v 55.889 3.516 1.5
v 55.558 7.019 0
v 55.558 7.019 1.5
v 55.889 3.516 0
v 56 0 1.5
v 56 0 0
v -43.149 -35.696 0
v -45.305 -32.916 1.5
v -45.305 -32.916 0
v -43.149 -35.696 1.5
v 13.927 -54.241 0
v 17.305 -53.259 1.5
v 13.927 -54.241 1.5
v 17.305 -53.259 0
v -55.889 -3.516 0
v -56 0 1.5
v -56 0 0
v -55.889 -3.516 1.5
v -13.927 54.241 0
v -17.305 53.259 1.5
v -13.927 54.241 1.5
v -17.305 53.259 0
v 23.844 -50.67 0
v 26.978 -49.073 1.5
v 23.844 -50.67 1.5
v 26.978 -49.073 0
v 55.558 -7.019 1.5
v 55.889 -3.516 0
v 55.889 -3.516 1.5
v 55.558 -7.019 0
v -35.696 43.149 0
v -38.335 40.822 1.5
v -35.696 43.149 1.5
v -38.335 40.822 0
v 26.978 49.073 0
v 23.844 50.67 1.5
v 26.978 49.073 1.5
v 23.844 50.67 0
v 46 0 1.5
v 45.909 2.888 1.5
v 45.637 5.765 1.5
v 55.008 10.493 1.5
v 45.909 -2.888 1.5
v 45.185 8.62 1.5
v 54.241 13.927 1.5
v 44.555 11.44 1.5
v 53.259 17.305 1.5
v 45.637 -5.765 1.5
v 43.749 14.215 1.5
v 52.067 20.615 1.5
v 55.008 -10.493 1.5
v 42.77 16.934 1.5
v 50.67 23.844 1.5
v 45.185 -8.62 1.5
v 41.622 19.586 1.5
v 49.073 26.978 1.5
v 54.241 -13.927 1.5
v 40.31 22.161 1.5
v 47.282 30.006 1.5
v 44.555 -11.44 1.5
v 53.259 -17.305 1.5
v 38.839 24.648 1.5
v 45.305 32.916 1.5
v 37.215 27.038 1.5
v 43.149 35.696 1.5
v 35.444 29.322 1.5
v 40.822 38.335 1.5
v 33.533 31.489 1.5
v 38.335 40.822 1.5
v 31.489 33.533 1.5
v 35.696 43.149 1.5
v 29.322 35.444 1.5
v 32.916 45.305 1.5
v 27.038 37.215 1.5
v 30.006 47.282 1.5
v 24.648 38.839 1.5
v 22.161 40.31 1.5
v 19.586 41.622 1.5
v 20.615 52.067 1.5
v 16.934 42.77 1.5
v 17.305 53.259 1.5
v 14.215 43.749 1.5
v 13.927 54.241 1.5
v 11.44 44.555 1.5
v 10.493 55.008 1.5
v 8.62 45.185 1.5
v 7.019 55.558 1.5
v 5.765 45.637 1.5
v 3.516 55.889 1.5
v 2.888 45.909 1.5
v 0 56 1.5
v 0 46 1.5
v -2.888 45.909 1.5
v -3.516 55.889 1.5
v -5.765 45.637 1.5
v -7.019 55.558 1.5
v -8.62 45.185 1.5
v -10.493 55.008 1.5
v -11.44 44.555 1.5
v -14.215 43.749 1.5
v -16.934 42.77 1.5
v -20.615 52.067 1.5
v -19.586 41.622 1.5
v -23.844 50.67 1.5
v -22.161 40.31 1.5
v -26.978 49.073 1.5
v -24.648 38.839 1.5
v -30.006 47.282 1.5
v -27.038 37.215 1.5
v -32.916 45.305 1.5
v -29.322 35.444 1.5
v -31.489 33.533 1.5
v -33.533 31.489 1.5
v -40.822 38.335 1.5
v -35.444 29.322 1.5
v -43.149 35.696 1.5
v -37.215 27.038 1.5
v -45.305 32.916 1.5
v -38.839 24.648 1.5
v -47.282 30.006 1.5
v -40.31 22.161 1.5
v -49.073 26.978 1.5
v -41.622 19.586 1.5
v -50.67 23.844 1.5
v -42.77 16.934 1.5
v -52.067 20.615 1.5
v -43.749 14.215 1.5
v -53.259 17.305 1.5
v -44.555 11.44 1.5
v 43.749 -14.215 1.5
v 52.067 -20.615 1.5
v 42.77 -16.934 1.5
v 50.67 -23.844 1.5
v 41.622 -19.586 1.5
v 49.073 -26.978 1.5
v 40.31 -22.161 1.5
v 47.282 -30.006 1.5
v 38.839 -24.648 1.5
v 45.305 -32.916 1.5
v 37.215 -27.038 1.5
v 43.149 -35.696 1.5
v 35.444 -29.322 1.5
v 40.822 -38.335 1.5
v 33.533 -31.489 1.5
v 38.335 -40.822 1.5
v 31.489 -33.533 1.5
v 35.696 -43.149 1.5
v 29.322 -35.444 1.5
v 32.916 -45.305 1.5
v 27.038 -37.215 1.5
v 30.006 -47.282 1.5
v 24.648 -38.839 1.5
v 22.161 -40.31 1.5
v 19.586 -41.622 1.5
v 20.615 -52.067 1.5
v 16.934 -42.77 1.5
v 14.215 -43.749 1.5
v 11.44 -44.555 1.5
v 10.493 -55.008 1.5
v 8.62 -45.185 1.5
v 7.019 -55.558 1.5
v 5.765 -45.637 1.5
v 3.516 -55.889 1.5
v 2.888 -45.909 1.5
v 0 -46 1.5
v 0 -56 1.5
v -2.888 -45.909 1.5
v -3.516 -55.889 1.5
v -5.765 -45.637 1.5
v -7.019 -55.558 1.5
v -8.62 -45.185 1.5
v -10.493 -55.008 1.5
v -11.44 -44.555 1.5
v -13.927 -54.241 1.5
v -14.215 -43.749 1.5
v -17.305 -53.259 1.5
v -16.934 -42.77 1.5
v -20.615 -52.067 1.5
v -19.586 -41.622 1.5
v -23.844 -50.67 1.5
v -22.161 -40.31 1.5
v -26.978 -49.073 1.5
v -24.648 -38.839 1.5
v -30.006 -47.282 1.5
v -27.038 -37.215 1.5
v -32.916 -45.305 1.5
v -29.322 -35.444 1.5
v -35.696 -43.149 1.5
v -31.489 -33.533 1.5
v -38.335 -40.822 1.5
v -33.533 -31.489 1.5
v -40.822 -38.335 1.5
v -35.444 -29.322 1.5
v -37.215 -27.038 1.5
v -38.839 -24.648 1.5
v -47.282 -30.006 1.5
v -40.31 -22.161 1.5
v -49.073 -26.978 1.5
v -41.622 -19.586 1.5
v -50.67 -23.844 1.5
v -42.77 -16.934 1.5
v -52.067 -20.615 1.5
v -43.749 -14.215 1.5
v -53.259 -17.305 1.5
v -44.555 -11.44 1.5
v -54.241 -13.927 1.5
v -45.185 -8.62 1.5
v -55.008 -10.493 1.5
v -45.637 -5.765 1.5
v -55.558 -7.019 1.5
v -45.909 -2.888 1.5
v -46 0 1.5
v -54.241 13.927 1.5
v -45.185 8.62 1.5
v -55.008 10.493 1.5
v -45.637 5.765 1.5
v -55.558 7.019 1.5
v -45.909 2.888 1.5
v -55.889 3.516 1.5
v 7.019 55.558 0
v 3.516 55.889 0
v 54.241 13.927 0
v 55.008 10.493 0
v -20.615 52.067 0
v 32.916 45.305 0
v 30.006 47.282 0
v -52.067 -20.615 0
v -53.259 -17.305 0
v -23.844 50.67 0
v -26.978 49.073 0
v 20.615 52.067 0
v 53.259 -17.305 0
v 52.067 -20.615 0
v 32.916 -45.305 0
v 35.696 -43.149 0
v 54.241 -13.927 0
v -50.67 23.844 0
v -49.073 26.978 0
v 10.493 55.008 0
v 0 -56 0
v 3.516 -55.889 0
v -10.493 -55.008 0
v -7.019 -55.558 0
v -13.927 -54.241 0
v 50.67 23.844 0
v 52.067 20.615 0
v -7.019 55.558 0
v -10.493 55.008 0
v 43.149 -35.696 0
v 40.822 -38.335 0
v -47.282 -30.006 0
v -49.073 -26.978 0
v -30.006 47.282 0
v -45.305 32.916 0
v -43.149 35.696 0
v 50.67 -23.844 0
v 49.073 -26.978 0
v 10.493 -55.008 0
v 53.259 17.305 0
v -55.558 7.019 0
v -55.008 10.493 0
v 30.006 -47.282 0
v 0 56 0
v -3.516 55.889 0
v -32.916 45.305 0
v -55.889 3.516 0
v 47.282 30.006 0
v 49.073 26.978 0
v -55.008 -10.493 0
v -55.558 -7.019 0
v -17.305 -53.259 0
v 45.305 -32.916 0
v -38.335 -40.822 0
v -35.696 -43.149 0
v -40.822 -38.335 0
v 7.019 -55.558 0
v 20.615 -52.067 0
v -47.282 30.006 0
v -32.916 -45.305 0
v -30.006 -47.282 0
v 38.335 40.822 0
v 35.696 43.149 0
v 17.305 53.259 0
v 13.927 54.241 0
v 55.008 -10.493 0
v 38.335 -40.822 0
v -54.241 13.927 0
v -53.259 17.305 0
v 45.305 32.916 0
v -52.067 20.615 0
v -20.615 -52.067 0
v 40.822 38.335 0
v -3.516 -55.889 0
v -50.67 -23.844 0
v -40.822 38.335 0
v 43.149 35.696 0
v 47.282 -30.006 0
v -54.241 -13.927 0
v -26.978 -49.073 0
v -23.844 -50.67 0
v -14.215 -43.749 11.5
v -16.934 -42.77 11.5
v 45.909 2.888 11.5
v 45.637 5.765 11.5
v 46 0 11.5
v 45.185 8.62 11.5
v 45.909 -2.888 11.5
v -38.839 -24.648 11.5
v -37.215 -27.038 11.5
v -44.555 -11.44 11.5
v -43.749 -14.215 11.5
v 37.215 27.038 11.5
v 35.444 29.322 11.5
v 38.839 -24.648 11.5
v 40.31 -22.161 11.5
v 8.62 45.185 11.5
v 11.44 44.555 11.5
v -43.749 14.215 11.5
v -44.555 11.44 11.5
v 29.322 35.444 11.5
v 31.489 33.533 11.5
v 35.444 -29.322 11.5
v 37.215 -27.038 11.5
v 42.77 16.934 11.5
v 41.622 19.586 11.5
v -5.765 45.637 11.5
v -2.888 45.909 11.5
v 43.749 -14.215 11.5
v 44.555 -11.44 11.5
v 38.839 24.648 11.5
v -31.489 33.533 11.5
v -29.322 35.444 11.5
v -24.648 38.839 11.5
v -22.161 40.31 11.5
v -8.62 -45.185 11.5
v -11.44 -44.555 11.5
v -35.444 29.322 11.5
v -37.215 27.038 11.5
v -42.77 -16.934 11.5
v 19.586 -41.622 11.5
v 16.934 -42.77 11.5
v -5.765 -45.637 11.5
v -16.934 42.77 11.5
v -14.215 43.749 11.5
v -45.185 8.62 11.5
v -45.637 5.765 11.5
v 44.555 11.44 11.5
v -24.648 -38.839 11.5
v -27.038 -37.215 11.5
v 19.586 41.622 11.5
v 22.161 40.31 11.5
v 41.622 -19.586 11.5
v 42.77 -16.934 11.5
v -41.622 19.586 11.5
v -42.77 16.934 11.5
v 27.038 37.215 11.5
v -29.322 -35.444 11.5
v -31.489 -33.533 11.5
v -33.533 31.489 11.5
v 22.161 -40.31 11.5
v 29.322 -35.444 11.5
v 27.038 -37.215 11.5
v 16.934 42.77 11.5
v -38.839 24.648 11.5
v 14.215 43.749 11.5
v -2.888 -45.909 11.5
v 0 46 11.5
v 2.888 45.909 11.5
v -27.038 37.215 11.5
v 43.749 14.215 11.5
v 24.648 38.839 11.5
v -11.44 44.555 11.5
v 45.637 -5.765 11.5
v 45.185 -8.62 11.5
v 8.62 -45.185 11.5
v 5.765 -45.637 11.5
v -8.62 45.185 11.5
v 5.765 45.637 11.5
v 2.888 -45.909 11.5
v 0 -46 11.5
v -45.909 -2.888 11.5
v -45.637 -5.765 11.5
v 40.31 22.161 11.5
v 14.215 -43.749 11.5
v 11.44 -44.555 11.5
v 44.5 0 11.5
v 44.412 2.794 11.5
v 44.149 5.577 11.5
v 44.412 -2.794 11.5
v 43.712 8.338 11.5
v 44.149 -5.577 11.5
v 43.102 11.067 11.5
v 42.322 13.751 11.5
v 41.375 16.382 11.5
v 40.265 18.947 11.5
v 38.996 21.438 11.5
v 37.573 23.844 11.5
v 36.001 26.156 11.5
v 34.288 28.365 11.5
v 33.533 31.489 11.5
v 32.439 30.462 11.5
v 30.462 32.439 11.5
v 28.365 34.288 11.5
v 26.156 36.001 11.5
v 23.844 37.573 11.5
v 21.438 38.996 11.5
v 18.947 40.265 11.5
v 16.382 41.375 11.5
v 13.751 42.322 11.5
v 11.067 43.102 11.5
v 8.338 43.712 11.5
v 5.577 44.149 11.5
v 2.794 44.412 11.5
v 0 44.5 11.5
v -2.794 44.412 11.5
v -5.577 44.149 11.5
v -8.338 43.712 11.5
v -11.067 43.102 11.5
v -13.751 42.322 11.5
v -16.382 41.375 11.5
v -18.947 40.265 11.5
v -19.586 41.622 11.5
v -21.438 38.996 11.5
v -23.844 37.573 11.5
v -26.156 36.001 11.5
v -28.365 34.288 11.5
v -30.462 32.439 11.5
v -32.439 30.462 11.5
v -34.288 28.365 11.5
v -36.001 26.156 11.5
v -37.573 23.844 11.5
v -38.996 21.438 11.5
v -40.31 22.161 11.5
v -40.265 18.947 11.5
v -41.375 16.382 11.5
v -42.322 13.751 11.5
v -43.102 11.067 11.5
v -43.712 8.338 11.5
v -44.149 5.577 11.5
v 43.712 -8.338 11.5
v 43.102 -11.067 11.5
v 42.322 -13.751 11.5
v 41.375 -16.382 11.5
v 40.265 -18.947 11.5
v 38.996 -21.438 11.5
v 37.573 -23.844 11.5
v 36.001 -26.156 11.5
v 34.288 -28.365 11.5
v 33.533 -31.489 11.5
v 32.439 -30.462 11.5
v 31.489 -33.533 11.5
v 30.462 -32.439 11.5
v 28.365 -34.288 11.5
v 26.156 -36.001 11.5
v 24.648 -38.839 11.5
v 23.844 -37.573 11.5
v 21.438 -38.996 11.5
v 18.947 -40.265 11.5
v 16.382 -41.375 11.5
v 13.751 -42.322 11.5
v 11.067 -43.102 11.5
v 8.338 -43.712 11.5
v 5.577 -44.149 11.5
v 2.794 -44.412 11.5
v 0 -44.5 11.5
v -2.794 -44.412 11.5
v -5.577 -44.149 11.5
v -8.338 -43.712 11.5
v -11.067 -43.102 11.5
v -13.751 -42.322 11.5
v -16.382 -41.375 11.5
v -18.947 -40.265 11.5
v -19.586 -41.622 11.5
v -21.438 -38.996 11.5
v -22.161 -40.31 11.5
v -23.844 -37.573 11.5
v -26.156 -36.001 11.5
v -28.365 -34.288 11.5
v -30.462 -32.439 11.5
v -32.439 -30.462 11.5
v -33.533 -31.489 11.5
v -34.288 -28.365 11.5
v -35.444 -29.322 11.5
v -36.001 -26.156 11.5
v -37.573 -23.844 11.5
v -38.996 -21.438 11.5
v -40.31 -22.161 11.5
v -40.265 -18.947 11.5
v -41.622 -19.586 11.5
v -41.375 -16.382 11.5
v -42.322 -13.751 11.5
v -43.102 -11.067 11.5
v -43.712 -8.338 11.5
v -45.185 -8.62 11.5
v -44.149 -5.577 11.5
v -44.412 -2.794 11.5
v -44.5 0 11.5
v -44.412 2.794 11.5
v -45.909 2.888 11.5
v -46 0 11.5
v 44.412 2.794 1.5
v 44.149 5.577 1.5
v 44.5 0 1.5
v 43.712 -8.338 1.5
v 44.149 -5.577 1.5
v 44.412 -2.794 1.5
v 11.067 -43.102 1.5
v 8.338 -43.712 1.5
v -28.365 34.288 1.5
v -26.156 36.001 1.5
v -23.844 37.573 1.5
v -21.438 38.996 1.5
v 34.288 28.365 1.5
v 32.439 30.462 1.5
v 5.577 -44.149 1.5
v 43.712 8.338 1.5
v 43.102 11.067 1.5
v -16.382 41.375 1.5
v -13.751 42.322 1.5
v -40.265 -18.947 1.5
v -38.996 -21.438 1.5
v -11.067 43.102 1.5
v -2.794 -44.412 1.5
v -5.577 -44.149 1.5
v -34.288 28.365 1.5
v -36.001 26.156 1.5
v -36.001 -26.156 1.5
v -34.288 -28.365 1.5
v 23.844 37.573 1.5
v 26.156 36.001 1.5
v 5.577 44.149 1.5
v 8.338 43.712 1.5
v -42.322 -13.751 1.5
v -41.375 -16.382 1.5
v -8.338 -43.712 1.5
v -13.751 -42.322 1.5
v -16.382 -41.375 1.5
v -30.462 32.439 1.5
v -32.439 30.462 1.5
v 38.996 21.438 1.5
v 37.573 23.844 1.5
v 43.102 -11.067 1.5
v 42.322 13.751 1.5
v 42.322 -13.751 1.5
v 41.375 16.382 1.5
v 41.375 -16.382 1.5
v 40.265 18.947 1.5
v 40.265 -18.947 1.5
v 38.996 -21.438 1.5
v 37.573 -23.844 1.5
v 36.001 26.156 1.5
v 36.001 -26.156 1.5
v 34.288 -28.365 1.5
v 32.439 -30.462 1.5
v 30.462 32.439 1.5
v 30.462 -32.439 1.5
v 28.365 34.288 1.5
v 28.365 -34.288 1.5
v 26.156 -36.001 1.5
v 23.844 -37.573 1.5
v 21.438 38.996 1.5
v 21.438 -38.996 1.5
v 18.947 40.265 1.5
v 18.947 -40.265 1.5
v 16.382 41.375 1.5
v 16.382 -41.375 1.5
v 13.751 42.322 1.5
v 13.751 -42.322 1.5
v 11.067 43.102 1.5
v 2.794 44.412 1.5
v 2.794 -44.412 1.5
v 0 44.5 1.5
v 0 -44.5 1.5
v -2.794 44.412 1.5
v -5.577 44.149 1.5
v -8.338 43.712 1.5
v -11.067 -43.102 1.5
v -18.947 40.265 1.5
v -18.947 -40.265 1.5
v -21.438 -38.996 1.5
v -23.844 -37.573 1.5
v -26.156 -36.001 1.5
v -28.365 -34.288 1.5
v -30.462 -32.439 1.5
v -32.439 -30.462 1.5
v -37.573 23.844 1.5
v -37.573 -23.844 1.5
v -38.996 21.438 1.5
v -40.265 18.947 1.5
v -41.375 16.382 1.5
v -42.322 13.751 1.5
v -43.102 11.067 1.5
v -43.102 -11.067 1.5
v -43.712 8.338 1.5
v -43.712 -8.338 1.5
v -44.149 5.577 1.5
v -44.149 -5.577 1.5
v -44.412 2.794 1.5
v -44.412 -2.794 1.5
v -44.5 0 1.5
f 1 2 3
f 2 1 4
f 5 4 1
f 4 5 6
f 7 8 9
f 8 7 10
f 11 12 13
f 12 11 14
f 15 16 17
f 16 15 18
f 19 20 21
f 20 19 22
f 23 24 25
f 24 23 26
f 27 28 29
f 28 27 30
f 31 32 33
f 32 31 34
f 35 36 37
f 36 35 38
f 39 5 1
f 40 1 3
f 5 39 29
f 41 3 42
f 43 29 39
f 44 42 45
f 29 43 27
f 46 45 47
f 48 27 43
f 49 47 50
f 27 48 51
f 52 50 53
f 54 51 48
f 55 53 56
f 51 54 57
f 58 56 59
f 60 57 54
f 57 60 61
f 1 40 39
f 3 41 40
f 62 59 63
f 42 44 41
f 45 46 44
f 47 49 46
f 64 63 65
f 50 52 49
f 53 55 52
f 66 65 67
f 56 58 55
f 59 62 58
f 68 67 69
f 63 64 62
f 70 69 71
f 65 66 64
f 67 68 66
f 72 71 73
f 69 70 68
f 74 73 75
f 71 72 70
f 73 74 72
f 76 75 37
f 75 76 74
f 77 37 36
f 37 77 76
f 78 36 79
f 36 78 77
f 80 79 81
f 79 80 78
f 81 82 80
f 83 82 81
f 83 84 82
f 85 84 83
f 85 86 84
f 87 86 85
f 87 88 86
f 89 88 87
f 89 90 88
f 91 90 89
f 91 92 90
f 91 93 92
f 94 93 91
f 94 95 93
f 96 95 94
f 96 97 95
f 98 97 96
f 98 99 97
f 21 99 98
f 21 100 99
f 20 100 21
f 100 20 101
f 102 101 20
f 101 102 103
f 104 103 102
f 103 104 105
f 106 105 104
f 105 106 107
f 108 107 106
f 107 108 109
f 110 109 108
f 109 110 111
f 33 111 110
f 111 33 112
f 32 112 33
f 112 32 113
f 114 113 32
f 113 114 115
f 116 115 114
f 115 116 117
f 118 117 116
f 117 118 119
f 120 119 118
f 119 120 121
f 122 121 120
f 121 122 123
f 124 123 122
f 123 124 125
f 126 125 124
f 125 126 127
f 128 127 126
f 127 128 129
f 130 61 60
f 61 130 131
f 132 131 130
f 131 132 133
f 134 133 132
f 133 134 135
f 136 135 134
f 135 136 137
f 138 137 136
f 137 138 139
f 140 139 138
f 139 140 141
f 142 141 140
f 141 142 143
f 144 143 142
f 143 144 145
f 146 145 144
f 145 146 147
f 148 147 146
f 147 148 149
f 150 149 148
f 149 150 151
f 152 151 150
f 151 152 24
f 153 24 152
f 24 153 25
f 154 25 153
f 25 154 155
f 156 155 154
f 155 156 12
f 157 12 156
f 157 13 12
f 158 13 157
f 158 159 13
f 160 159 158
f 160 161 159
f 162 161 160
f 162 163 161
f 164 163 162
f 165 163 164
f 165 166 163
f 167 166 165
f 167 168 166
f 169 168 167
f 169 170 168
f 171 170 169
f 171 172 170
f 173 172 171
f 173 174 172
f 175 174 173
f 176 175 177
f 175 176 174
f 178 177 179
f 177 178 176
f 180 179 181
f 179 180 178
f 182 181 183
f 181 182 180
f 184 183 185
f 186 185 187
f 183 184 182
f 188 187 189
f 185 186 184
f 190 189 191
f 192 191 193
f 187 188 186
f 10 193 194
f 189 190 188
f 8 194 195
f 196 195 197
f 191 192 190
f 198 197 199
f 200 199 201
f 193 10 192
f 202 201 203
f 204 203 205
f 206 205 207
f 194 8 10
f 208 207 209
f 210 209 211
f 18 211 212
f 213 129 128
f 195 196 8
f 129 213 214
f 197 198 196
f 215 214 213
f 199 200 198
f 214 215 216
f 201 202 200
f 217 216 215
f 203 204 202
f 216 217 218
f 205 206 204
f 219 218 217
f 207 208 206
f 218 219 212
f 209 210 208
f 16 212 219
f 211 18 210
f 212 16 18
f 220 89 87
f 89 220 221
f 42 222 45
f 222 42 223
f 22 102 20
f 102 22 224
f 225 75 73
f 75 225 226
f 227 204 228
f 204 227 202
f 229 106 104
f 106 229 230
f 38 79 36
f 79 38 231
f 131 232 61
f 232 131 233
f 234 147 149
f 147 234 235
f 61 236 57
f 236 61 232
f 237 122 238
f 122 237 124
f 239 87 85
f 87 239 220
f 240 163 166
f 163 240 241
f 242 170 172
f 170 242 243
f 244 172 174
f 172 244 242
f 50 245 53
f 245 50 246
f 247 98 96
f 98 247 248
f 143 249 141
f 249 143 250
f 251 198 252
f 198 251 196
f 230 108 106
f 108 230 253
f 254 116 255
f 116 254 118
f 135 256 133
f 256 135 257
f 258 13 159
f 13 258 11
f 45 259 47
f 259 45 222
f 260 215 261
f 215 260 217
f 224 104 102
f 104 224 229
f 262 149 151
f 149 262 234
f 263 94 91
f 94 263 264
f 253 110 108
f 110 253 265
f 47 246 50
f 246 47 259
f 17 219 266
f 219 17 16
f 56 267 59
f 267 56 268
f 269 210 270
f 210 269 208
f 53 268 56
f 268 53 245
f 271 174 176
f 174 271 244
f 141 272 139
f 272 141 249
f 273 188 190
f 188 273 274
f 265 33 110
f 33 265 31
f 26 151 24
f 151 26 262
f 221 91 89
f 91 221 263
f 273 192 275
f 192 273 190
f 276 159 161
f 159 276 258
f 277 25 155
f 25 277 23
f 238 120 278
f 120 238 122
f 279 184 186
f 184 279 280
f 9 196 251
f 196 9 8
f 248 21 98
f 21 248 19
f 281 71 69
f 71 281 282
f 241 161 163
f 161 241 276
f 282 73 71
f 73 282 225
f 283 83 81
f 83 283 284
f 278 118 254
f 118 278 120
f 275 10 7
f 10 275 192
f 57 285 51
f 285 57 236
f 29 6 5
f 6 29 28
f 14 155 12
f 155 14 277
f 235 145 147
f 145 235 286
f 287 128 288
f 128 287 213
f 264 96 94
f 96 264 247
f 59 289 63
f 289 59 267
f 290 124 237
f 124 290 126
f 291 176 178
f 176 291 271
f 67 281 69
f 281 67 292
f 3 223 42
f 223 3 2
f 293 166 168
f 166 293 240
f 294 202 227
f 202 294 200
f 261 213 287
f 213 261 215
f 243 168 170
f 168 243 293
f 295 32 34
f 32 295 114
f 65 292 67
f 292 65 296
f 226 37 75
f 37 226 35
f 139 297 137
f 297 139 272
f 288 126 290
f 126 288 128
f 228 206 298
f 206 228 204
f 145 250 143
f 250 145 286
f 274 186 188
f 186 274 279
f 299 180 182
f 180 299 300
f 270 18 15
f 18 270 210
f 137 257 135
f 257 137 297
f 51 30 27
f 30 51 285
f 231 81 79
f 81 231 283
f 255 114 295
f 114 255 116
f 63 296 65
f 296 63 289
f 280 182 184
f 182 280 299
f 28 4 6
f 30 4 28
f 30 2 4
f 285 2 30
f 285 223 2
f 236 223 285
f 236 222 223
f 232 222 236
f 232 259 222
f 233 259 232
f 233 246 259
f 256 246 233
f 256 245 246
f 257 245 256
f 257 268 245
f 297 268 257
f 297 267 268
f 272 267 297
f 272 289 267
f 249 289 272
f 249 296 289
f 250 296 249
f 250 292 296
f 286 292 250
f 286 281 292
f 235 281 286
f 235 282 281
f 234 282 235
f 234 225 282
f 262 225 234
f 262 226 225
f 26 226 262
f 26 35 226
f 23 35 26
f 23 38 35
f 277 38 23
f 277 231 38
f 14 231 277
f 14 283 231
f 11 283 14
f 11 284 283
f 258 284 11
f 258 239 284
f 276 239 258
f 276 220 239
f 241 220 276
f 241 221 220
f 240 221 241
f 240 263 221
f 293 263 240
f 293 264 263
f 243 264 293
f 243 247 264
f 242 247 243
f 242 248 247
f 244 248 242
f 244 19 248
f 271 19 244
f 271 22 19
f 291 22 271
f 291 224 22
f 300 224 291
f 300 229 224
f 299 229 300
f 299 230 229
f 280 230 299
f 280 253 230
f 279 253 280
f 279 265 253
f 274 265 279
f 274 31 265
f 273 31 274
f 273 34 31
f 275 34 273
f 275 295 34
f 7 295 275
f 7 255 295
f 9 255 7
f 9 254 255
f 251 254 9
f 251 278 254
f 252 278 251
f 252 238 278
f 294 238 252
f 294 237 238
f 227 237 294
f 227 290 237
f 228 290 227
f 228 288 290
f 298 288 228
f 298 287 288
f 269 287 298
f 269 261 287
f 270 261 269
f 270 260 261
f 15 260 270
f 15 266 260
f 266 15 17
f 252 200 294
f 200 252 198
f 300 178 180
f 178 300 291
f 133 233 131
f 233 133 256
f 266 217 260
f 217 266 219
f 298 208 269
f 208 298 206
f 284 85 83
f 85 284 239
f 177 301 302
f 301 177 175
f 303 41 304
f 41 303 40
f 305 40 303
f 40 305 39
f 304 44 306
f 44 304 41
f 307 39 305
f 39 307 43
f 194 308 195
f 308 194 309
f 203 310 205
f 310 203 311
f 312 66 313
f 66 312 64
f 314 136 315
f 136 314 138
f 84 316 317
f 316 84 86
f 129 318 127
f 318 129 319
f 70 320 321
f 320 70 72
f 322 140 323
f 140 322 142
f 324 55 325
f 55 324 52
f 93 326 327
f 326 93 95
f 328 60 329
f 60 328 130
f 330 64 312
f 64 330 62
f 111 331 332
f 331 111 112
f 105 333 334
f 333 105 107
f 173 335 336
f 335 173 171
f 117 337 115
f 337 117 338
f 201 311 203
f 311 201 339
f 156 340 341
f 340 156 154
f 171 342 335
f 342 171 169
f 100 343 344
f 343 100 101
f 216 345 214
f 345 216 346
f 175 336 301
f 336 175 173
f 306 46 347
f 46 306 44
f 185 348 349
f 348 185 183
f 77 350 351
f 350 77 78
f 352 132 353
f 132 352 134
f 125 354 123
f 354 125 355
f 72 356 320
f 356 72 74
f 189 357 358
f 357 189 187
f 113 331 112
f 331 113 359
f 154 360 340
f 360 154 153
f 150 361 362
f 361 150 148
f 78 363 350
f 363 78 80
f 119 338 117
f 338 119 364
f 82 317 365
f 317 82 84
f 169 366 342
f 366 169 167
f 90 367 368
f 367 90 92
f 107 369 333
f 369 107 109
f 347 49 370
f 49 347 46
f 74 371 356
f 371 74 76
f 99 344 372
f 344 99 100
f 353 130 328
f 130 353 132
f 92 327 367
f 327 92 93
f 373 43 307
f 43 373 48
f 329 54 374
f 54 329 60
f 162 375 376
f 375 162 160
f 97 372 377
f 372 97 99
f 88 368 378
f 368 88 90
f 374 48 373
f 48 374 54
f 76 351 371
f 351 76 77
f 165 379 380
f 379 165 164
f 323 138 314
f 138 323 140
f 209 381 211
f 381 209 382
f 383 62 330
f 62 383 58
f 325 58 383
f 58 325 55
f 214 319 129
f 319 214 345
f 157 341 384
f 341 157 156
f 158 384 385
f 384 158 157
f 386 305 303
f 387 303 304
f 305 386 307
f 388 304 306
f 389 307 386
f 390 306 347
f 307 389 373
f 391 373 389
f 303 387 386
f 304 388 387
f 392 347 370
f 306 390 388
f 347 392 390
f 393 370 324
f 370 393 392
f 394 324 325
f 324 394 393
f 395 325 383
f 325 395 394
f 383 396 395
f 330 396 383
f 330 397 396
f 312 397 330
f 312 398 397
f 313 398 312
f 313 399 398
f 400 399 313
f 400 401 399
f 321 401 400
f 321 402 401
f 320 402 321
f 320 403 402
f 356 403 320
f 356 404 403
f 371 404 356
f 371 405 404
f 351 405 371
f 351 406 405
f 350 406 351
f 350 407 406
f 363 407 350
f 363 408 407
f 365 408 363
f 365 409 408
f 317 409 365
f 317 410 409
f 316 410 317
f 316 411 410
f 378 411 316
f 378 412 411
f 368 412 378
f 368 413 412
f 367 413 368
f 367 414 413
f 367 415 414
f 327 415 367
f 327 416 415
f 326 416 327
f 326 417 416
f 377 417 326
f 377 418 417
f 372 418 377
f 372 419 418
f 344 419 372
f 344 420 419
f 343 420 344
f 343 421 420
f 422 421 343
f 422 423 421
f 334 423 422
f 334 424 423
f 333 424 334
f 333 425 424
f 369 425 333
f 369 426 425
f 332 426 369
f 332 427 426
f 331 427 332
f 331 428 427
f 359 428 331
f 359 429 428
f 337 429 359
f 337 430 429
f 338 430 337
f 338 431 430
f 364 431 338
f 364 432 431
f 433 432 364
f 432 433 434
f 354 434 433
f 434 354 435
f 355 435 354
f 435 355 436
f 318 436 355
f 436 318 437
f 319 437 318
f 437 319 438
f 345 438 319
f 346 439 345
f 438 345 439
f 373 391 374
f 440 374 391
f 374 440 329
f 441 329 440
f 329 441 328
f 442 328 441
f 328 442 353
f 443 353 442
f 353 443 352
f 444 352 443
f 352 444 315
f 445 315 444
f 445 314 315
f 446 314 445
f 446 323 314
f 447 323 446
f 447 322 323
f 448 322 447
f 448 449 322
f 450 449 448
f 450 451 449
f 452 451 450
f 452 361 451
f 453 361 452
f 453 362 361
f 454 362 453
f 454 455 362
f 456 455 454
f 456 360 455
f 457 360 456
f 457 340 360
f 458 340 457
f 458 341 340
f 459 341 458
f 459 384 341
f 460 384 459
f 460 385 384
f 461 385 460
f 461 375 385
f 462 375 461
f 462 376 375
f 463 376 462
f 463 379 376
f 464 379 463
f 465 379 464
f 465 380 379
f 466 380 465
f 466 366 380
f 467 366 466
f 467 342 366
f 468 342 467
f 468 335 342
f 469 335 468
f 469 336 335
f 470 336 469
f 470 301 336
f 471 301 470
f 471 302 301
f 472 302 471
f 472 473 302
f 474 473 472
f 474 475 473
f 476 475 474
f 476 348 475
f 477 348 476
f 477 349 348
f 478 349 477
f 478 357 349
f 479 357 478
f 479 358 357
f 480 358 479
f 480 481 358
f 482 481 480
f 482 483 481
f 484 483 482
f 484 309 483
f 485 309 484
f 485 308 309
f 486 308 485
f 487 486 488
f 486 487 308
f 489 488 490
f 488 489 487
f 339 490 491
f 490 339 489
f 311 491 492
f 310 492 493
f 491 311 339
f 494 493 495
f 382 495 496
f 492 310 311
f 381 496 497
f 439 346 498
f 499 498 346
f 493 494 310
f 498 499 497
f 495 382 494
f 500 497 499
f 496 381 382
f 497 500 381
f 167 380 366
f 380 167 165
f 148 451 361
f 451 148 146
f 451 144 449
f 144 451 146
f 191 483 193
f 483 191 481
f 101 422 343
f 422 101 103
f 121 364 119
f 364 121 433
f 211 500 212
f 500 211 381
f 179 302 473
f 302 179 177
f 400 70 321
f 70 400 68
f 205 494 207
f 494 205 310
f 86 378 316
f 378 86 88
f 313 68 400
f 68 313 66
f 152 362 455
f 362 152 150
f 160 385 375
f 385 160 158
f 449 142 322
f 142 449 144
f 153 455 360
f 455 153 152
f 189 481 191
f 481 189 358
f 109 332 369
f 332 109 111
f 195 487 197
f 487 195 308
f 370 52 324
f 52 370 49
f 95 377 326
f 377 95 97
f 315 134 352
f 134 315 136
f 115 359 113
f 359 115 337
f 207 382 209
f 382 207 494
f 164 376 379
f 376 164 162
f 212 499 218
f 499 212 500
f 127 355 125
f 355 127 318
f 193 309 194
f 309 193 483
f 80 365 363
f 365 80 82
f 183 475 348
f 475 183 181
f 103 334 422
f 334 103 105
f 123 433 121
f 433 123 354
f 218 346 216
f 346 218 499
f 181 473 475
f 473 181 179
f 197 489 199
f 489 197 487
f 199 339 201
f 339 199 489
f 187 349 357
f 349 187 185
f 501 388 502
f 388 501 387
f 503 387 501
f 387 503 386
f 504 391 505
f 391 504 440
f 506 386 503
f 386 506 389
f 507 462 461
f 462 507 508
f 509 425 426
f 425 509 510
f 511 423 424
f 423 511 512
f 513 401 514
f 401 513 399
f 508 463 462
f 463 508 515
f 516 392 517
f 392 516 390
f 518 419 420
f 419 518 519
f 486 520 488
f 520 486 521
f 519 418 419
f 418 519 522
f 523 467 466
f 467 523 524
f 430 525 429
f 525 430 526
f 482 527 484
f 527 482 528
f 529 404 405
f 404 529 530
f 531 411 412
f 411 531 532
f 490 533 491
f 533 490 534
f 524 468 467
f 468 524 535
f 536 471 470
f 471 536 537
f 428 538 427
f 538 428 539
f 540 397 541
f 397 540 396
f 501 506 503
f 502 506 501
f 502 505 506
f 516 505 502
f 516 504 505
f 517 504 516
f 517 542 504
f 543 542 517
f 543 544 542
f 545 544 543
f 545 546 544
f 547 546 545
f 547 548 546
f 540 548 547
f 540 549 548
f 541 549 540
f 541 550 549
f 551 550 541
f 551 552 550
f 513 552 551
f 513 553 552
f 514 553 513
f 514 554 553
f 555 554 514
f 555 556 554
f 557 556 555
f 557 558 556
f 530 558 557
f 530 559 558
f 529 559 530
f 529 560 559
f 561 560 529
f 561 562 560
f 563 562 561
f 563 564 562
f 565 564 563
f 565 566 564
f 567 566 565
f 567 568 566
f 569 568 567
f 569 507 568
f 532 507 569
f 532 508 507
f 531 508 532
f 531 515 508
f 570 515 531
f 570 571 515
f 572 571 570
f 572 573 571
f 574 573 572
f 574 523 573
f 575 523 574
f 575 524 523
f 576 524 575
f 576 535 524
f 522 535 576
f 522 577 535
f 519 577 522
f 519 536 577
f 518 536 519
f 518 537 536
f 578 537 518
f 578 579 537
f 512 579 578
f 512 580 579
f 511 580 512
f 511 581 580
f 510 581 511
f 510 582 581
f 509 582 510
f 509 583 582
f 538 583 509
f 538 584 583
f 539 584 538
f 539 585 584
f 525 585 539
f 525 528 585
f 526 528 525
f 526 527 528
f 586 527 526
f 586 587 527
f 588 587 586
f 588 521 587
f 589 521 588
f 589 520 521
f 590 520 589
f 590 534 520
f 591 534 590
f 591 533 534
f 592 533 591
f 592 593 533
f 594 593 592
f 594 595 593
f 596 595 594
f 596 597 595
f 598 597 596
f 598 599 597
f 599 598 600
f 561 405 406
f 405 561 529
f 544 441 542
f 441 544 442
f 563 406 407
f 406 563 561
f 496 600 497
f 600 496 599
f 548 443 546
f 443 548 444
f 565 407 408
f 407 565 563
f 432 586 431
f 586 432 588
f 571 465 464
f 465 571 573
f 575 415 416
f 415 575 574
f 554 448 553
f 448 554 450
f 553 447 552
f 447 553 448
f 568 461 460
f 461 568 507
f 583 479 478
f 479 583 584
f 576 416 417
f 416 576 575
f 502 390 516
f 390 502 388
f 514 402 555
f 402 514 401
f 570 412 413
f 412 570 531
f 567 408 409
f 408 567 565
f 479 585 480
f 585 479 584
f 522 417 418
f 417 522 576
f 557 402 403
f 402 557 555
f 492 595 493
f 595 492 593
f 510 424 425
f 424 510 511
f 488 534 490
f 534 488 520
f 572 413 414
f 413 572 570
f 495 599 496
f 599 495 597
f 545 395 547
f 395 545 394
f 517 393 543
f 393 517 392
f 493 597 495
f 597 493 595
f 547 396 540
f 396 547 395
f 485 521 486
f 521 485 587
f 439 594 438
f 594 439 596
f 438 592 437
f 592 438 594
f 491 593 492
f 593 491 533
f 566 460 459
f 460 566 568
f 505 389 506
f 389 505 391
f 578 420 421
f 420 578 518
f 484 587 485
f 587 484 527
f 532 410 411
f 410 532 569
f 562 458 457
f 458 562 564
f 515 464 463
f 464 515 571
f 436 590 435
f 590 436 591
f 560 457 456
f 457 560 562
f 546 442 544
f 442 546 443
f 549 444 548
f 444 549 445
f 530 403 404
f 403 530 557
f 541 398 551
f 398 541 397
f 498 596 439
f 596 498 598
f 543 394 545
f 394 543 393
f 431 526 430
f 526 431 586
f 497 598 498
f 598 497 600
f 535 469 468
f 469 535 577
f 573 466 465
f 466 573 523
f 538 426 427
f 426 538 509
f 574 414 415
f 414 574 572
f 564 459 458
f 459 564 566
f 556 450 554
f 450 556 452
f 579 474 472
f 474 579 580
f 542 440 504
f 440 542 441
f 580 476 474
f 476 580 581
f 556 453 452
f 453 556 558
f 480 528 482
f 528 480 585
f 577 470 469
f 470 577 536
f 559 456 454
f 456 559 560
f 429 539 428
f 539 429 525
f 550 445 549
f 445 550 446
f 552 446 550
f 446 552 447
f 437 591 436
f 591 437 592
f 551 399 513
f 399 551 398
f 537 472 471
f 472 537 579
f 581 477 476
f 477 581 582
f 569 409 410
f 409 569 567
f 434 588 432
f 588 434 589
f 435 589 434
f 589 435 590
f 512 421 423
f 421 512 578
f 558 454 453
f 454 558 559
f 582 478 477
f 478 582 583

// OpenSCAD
//HEPA filter blanking cap
$fn=100;
//You can adjust these four variables
//Mainly the filter hole diameter
filterhole=92;     //diameter of filter hole
rim=10;               //size of rim (10)
insert=10;          //Length of insert (10)
thickness=1.5;  //Thickness of plastic (1.5)
//Do not adjust anything below here
wall=(2*thickness);
cap=thickness+insert;
difference(){
union(){
//seal plate 
cylinder(h=thickness,d=filterhole+(2*rim));
//filter insert 
cylinder(h=cap,d=filterhole);
}
//filter insert core
translate([0,0,thickness])  
cylinder(h=cap+1,d=filterhole-wall);
}
